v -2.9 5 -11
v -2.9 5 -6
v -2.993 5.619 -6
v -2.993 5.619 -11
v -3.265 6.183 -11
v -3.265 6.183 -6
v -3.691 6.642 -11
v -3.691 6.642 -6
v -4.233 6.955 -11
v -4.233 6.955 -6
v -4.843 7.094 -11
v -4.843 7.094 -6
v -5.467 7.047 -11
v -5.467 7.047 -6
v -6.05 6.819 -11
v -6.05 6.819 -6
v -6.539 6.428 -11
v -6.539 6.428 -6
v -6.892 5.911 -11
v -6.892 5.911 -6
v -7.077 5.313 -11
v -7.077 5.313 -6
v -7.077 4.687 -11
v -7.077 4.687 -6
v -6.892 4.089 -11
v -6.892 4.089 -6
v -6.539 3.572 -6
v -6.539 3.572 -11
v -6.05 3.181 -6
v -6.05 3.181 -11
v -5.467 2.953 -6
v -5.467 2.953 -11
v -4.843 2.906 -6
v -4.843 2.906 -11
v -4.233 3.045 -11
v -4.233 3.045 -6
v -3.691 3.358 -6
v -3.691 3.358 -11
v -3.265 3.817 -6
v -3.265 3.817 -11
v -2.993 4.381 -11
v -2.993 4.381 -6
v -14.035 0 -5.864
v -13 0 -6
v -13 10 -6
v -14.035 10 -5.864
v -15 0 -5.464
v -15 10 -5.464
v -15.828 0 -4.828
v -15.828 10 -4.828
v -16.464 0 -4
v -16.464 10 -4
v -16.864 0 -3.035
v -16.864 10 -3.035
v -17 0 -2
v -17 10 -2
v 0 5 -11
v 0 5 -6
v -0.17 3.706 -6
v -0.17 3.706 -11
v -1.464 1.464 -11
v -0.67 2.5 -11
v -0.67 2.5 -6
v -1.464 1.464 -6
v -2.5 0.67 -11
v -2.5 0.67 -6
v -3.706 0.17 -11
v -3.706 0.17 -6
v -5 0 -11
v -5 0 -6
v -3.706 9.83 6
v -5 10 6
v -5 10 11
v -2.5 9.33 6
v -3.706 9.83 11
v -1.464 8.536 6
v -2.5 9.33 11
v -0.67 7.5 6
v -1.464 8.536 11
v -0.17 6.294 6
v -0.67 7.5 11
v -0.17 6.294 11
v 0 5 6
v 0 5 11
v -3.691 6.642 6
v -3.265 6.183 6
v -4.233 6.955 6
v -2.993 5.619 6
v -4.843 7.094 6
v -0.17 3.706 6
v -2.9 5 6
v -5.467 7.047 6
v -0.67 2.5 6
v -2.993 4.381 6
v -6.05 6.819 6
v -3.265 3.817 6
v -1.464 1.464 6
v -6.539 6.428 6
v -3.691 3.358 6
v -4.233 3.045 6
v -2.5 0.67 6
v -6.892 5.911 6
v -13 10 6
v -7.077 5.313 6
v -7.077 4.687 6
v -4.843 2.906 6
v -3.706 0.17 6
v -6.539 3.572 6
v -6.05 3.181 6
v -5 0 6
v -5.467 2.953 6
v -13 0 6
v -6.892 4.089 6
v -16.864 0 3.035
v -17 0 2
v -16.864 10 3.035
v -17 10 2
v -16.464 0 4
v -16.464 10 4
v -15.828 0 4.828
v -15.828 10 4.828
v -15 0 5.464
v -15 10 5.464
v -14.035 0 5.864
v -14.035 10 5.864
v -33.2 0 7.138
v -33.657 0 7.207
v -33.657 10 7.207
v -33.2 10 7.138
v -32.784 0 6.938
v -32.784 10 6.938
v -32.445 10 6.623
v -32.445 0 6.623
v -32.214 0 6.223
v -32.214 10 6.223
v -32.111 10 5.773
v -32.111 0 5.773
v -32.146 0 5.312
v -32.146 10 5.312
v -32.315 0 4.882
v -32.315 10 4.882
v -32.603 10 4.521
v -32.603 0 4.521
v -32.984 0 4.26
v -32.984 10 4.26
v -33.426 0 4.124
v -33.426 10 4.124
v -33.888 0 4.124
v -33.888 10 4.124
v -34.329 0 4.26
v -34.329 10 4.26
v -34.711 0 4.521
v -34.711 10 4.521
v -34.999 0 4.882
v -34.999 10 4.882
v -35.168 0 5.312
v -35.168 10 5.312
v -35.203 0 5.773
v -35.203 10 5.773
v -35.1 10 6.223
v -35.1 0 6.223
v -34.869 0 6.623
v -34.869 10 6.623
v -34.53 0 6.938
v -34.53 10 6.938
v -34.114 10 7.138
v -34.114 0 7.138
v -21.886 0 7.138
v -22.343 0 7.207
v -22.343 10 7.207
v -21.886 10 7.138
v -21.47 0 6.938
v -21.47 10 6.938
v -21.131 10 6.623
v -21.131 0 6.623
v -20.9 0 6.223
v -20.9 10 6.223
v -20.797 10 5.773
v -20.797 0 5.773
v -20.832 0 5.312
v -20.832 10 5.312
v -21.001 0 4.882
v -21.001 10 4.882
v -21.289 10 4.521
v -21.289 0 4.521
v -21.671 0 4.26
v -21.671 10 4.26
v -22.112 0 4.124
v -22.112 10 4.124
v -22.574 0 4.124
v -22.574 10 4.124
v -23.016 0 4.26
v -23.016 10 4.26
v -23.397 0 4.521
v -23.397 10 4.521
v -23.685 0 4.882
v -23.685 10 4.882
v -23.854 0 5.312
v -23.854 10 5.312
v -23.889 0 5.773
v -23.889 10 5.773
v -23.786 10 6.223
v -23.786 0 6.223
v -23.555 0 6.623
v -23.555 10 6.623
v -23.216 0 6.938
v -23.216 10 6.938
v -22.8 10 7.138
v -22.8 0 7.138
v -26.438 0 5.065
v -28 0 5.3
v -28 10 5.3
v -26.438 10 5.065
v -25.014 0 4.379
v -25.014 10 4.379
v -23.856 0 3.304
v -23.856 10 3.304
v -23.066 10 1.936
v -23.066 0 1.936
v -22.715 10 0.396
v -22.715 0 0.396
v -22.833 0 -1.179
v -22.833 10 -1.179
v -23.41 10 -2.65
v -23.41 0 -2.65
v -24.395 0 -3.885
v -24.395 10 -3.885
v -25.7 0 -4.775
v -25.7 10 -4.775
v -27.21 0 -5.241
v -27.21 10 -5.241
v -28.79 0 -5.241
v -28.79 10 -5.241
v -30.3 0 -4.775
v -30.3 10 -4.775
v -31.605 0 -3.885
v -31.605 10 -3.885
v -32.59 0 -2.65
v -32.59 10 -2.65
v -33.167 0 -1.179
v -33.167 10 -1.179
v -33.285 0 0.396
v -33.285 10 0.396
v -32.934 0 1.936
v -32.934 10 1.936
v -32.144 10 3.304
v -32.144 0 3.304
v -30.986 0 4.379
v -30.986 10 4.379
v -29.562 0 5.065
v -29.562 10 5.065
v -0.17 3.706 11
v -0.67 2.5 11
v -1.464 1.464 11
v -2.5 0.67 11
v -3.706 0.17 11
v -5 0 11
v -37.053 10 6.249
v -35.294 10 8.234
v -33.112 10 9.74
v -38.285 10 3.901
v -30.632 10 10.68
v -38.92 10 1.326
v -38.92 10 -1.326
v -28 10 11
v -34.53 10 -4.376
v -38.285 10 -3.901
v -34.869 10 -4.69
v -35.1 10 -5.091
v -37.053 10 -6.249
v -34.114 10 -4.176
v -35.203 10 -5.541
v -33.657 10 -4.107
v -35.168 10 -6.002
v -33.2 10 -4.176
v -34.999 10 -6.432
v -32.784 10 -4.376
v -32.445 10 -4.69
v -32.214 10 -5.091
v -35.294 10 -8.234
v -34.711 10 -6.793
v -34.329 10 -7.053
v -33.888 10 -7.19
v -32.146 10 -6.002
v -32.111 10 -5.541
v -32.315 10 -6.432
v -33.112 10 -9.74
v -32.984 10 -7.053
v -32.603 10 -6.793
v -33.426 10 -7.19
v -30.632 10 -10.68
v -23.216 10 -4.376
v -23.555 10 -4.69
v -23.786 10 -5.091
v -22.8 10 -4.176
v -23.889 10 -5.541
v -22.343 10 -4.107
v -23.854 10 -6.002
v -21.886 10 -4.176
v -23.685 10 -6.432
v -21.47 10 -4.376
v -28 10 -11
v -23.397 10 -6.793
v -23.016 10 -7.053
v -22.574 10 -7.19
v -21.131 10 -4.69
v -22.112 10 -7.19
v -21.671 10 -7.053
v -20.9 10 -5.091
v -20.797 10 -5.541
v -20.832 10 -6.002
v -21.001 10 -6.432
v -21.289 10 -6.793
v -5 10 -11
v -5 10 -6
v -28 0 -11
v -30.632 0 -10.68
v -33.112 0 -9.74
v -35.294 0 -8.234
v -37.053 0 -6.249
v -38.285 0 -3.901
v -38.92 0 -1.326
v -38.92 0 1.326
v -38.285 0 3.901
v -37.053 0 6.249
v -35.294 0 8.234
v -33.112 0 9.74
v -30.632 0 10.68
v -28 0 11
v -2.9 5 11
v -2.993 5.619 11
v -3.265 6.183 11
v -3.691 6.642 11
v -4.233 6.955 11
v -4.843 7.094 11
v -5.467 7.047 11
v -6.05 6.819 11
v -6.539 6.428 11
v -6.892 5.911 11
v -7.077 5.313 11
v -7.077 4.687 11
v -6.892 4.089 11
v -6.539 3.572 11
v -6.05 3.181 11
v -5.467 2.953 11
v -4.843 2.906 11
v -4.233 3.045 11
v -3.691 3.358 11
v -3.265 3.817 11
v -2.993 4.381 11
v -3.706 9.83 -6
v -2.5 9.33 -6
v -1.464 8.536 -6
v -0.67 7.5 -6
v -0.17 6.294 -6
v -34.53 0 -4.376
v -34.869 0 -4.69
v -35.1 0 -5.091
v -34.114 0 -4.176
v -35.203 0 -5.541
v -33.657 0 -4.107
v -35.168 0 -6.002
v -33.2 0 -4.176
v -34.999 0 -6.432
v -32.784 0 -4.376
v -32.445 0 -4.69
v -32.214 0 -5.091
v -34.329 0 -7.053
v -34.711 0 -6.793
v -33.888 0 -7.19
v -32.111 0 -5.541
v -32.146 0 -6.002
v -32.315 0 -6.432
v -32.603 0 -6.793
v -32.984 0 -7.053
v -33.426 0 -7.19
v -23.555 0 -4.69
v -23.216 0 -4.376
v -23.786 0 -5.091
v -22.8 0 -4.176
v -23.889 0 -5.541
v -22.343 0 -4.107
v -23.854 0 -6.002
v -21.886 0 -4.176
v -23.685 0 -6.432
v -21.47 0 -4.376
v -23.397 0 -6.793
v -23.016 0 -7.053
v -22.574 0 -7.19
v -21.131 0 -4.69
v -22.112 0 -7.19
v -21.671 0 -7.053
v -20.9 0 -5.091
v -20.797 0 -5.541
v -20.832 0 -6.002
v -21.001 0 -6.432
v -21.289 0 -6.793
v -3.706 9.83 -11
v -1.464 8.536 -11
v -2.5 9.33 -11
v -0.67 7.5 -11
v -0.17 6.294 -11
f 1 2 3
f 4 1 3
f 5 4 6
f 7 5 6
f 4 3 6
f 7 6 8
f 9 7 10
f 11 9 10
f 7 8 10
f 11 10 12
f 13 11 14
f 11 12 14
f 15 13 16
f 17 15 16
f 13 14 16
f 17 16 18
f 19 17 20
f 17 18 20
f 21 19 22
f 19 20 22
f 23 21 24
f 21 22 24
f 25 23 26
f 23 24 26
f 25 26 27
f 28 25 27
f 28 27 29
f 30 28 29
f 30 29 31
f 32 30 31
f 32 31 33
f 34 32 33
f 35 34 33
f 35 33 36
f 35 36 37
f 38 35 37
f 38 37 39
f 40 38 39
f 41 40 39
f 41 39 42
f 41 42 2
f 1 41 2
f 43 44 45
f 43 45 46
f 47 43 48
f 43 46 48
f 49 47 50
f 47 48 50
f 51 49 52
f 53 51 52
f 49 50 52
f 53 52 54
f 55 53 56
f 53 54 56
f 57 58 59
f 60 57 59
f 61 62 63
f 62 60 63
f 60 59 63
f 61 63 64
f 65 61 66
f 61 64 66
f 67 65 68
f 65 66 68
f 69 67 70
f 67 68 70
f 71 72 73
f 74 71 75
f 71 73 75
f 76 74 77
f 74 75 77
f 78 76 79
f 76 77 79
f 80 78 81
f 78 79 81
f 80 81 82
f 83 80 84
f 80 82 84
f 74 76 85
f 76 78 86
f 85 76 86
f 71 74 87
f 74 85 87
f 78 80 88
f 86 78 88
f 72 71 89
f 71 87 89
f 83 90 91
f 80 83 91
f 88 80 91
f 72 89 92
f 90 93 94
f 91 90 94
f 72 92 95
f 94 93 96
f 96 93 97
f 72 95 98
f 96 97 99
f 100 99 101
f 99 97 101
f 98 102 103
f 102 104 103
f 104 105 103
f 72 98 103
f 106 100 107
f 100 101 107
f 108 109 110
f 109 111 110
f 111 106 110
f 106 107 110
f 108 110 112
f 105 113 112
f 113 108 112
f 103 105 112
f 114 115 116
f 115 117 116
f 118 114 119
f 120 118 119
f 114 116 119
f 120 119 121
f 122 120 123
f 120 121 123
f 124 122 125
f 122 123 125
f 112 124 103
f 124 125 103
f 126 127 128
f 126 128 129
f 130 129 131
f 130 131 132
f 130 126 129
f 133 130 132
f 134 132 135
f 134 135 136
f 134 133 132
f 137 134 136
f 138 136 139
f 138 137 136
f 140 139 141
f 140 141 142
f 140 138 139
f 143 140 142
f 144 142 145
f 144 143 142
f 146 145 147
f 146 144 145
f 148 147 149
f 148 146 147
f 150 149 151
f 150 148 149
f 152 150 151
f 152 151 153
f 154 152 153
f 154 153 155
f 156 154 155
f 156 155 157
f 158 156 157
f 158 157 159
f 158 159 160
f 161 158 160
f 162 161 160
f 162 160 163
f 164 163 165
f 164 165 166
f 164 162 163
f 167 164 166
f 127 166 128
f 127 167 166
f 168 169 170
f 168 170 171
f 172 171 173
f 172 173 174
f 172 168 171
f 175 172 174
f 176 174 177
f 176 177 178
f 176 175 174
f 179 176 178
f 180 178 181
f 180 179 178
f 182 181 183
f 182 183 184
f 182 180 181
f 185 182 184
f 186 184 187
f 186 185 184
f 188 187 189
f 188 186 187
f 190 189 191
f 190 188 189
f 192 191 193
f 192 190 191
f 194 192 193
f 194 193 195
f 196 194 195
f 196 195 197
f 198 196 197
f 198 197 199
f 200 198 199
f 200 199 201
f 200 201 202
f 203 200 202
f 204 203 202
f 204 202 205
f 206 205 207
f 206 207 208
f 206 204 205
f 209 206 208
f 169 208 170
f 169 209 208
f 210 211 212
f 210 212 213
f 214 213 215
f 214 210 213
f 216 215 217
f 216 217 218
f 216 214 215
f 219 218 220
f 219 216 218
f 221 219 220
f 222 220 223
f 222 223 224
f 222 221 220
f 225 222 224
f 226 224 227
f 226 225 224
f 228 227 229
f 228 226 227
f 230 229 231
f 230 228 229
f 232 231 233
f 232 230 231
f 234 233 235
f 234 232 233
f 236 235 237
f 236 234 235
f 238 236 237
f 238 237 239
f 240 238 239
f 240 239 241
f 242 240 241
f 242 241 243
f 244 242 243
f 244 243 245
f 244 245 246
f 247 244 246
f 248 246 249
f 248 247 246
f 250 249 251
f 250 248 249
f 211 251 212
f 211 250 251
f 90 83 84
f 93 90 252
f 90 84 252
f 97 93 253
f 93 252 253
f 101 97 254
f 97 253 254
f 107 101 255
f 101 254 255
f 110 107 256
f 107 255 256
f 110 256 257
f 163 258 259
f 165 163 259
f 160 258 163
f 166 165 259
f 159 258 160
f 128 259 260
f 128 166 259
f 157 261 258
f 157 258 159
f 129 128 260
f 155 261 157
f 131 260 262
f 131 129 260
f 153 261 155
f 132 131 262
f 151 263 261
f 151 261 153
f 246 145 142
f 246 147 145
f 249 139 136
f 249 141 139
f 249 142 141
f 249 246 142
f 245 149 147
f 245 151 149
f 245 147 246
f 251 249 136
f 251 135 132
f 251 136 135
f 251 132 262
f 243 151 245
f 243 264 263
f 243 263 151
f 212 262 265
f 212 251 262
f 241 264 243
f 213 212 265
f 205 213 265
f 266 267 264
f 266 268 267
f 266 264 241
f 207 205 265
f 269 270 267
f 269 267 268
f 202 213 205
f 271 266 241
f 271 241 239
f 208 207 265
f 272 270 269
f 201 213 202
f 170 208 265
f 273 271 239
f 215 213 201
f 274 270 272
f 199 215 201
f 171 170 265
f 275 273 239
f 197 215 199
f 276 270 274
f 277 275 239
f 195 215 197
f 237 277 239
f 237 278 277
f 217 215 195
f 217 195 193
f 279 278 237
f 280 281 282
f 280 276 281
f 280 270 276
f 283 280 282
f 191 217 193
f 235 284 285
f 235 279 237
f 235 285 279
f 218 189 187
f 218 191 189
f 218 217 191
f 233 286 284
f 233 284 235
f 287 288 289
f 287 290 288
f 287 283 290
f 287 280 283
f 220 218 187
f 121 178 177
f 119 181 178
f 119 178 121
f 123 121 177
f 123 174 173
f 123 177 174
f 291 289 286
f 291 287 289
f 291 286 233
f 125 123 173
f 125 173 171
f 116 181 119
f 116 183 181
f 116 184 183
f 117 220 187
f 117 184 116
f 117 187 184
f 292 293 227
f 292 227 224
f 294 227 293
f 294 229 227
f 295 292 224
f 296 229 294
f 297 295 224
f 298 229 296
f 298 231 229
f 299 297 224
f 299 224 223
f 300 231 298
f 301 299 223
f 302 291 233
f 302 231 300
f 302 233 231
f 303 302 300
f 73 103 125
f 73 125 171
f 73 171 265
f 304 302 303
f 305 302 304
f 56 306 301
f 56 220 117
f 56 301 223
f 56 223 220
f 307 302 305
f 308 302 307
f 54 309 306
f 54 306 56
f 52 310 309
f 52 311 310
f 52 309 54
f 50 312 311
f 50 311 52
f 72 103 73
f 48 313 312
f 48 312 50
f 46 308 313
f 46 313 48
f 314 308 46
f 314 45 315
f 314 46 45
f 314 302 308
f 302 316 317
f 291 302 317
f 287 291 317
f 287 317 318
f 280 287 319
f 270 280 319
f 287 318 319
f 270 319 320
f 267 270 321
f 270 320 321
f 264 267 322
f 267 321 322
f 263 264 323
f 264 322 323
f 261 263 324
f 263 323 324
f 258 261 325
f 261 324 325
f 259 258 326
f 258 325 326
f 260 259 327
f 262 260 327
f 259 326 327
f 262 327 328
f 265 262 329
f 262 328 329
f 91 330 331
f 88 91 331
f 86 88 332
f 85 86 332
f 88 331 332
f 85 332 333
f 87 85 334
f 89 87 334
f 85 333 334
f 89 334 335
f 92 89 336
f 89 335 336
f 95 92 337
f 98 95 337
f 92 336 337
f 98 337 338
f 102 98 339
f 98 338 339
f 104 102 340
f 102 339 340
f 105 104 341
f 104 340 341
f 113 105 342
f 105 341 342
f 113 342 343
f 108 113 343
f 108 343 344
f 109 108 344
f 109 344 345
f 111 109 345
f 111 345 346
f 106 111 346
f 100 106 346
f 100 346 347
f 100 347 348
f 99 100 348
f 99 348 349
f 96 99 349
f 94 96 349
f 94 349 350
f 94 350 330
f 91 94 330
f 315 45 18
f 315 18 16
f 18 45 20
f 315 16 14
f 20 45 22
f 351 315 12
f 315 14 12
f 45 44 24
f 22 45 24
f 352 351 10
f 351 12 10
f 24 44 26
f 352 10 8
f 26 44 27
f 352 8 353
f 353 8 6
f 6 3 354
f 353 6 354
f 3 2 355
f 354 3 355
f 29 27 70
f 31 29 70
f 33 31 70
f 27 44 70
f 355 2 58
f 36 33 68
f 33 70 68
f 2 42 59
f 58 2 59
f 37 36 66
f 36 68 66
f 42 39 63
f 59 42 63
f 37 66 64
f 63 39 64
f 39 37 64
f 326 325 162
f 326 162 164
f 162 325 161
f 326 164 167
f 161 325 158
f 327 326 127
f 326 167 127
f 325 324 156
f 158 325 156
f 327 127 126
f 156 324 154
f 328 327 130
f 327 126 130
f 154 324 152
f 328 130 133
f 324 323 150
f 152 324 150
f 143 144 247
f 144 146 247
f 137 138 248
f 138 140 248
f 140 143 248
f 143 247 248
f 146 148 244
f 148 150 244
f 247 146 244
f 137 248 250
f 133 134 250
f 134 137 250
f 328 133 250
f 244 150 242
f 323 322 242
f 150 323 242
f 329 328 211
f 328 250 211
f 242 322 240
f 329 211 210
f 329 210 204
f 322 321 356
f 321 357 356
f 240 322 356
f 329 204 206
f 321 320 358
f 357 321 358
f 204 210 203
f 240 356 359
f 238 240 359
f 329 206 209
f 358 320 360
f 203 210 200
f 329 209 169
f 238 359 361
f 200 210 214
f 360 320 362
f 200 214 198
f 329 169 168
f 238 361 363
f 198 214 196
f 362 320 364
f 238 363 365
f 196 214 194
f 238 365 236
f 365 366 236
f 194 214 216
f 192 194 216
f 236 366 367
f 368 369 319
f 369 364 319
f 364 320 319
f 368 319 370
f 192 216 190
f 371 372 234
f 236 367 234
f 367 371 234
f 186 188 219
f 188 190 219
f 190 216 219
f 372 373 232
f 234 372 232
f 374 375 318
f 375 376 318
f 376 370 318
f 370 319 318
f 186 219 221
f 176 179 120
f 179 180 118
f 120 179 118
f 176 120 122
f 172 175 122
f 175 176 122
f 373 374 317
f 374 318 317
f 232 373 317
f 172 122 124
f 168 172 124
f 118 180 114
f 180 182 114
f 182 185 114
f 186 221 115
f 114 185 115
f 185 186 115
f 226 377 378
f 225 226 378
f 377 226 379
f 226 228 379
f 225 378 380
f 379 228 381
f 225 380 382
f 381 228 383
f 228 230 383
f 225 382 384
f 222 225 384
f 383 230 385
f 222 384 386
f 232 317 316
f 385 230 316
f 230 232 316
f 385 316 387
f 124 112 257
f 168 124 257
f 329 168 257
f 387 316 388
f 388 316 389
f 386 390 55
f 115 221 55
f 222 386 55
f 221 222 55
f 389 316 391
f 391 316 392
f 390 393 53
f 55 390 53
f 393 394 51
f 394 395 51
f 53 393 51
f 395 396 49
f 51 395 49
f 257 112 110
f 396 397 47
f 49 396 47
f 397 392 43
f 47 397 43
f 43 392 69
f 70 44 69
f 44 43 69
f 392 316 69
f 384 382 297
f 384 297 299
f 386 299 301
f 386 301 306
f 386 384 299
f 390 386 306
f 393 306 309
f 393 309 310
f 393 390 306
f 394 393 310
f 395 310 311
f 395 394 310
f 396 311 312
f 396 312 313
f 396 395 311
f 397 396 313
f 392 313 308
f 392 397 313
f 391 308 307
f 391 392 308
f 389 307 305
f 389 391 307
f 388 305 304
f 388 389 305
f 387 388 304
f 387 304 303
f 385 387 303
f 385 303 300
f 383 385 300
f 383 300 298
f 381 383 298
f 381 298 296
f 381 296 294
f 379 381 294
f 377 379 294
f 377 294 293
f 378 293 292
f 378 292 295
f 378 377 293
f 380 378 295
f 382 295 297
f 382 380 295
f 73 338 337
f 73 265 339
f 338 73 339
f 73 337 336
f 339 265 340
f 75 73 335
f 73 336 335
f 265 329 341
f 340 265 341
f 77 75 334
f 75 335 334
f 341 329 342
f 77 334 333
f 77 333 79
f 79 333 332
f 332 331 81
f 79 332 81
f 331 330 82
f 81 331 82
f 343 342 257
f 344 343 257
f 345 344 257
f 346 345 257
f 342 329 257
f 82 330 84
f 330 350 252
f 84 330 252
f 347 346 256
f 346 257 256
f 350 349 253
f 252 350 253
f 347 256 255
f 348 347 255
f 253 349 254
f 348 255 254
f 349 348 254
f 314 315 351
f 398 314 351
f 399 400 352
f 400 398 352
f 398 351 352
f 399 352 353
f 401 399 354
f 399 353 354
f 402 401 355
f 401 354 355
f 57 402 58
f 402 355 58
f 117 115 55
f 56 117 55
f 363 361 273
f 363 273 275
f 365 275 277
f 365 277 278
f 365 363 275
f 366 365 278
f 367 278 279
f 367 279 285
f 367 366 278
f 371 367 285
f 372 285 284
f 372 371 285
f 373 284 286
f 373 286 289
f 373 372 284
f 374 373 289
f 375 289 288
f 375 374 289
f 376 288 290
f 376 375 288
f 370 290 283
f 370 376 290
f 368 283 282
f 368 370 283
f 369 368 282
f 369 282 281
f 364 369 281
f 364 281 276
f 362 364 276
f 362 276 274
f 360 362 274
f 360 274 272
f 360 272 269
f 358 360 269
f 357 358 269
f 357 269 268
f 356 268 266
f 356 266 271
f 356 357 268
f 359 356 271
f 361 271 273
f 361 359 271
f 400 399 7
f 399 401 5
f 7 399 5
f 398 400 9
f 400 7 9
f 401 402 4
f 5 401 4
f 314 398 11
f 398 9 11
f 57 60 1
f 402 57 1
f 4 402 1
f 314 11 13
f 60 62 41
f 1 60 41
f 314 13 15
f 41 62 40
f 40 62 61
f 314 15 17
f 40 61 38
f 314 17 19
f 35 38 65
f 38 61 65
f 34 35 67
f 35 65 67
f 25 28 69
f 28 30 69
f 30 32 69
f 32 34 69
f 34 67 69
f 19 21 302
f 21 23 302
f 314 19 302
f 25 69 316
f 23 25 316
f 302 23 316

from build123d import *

# Parameters (mm, degrees)
SKETCH2_R           = 1.55
SKETCH2_R_2         = 5.3
BOSS_EXTRUDE2_DEPTH = 10
SKETCH7_R           = 2.1
CUT_EXTRUDE2_DEPTH  = 46.880278988
FILLET1_R           = 4


with BuildPart() as part:
    # Sketch2 → Boss-Extrude2 (new body)
    with BuildSketch(Plane(origin=(0, 0, 0), x_dir=(1, 0, 0), z_dir=(0, 1, 0))):
        with BuildLine():
            ThreePointArc((-28, 11), (-39, 0), (-28, -11))
            Line((-28, -11), (0, -11))
            Line((0, -11), (0, -6))
            Line((0, -6), (-17, -6))
            Line((-17, -6), (-17, 6))
            Line((-17, 6), (0, 6))
            Line((0, 6), (0, 11))
            Line((0, 11), (-28, 11))
        make_face()
        with Locations((-33.656854249, -5.656854249)):
            Circle(SKETCH2_R, mode=Mode.SUBTRACT)
        with Locations((-22.343145751, -5.656854249)):
            Circle(SKETCH2_R, mode=Mode.SUBTRACT)
        with Locations((-28, 0)):
            Circle(SKETCH2_R_2, mode=Mode.SUBTRACT)
        with Locations((-33.656854249, 5.656854249)):
            Circle(SKETCH2_R, mode=Mode.SUBTRACT)
        with Locations((-22.343145751, 5.656854249)):
            Circle(SKETCH2_R, mode=Mode.SUBTRACT)
    extrude(amount=BOSS_EXTRUDE2_DEPTH)

    # Sketch7 → Cut-Extrude2 (cut, through all)
    with BuildSketch(Plane.XY.offset(11)):
        with BuildLine():
            Line((0, 10), (-5, 10))
            ThreePointArc((-5, 10), (-1.464466094, 8.535533906), (0, 5))
            Line((0, 5), (0, 10))
        make_face()
        with BuildLine():
            Line((0, 0), (0, 5))
            ThreePointArc((0, 5), (-1.464466094, 1.464466094), (-5, 0))
            Line((-5, 0), (0, 0))
        make_face()
        with Locations((-5, 5)):
            Circle(SKETCH7_R)
    extrude(amount=-CUT_EXTRUDE2_DEPTH, mode=Mode.SUBTRACT)

    # Fillet1
    fillet1_edges = [part.edges().sort_by_distance(p)[0] for p in [
        (-17, 5, -6),
        (-17, 5, 6),
    ]]
    fillet(fillet1_edges, radius=FILLET1_R)


solid = part.part
